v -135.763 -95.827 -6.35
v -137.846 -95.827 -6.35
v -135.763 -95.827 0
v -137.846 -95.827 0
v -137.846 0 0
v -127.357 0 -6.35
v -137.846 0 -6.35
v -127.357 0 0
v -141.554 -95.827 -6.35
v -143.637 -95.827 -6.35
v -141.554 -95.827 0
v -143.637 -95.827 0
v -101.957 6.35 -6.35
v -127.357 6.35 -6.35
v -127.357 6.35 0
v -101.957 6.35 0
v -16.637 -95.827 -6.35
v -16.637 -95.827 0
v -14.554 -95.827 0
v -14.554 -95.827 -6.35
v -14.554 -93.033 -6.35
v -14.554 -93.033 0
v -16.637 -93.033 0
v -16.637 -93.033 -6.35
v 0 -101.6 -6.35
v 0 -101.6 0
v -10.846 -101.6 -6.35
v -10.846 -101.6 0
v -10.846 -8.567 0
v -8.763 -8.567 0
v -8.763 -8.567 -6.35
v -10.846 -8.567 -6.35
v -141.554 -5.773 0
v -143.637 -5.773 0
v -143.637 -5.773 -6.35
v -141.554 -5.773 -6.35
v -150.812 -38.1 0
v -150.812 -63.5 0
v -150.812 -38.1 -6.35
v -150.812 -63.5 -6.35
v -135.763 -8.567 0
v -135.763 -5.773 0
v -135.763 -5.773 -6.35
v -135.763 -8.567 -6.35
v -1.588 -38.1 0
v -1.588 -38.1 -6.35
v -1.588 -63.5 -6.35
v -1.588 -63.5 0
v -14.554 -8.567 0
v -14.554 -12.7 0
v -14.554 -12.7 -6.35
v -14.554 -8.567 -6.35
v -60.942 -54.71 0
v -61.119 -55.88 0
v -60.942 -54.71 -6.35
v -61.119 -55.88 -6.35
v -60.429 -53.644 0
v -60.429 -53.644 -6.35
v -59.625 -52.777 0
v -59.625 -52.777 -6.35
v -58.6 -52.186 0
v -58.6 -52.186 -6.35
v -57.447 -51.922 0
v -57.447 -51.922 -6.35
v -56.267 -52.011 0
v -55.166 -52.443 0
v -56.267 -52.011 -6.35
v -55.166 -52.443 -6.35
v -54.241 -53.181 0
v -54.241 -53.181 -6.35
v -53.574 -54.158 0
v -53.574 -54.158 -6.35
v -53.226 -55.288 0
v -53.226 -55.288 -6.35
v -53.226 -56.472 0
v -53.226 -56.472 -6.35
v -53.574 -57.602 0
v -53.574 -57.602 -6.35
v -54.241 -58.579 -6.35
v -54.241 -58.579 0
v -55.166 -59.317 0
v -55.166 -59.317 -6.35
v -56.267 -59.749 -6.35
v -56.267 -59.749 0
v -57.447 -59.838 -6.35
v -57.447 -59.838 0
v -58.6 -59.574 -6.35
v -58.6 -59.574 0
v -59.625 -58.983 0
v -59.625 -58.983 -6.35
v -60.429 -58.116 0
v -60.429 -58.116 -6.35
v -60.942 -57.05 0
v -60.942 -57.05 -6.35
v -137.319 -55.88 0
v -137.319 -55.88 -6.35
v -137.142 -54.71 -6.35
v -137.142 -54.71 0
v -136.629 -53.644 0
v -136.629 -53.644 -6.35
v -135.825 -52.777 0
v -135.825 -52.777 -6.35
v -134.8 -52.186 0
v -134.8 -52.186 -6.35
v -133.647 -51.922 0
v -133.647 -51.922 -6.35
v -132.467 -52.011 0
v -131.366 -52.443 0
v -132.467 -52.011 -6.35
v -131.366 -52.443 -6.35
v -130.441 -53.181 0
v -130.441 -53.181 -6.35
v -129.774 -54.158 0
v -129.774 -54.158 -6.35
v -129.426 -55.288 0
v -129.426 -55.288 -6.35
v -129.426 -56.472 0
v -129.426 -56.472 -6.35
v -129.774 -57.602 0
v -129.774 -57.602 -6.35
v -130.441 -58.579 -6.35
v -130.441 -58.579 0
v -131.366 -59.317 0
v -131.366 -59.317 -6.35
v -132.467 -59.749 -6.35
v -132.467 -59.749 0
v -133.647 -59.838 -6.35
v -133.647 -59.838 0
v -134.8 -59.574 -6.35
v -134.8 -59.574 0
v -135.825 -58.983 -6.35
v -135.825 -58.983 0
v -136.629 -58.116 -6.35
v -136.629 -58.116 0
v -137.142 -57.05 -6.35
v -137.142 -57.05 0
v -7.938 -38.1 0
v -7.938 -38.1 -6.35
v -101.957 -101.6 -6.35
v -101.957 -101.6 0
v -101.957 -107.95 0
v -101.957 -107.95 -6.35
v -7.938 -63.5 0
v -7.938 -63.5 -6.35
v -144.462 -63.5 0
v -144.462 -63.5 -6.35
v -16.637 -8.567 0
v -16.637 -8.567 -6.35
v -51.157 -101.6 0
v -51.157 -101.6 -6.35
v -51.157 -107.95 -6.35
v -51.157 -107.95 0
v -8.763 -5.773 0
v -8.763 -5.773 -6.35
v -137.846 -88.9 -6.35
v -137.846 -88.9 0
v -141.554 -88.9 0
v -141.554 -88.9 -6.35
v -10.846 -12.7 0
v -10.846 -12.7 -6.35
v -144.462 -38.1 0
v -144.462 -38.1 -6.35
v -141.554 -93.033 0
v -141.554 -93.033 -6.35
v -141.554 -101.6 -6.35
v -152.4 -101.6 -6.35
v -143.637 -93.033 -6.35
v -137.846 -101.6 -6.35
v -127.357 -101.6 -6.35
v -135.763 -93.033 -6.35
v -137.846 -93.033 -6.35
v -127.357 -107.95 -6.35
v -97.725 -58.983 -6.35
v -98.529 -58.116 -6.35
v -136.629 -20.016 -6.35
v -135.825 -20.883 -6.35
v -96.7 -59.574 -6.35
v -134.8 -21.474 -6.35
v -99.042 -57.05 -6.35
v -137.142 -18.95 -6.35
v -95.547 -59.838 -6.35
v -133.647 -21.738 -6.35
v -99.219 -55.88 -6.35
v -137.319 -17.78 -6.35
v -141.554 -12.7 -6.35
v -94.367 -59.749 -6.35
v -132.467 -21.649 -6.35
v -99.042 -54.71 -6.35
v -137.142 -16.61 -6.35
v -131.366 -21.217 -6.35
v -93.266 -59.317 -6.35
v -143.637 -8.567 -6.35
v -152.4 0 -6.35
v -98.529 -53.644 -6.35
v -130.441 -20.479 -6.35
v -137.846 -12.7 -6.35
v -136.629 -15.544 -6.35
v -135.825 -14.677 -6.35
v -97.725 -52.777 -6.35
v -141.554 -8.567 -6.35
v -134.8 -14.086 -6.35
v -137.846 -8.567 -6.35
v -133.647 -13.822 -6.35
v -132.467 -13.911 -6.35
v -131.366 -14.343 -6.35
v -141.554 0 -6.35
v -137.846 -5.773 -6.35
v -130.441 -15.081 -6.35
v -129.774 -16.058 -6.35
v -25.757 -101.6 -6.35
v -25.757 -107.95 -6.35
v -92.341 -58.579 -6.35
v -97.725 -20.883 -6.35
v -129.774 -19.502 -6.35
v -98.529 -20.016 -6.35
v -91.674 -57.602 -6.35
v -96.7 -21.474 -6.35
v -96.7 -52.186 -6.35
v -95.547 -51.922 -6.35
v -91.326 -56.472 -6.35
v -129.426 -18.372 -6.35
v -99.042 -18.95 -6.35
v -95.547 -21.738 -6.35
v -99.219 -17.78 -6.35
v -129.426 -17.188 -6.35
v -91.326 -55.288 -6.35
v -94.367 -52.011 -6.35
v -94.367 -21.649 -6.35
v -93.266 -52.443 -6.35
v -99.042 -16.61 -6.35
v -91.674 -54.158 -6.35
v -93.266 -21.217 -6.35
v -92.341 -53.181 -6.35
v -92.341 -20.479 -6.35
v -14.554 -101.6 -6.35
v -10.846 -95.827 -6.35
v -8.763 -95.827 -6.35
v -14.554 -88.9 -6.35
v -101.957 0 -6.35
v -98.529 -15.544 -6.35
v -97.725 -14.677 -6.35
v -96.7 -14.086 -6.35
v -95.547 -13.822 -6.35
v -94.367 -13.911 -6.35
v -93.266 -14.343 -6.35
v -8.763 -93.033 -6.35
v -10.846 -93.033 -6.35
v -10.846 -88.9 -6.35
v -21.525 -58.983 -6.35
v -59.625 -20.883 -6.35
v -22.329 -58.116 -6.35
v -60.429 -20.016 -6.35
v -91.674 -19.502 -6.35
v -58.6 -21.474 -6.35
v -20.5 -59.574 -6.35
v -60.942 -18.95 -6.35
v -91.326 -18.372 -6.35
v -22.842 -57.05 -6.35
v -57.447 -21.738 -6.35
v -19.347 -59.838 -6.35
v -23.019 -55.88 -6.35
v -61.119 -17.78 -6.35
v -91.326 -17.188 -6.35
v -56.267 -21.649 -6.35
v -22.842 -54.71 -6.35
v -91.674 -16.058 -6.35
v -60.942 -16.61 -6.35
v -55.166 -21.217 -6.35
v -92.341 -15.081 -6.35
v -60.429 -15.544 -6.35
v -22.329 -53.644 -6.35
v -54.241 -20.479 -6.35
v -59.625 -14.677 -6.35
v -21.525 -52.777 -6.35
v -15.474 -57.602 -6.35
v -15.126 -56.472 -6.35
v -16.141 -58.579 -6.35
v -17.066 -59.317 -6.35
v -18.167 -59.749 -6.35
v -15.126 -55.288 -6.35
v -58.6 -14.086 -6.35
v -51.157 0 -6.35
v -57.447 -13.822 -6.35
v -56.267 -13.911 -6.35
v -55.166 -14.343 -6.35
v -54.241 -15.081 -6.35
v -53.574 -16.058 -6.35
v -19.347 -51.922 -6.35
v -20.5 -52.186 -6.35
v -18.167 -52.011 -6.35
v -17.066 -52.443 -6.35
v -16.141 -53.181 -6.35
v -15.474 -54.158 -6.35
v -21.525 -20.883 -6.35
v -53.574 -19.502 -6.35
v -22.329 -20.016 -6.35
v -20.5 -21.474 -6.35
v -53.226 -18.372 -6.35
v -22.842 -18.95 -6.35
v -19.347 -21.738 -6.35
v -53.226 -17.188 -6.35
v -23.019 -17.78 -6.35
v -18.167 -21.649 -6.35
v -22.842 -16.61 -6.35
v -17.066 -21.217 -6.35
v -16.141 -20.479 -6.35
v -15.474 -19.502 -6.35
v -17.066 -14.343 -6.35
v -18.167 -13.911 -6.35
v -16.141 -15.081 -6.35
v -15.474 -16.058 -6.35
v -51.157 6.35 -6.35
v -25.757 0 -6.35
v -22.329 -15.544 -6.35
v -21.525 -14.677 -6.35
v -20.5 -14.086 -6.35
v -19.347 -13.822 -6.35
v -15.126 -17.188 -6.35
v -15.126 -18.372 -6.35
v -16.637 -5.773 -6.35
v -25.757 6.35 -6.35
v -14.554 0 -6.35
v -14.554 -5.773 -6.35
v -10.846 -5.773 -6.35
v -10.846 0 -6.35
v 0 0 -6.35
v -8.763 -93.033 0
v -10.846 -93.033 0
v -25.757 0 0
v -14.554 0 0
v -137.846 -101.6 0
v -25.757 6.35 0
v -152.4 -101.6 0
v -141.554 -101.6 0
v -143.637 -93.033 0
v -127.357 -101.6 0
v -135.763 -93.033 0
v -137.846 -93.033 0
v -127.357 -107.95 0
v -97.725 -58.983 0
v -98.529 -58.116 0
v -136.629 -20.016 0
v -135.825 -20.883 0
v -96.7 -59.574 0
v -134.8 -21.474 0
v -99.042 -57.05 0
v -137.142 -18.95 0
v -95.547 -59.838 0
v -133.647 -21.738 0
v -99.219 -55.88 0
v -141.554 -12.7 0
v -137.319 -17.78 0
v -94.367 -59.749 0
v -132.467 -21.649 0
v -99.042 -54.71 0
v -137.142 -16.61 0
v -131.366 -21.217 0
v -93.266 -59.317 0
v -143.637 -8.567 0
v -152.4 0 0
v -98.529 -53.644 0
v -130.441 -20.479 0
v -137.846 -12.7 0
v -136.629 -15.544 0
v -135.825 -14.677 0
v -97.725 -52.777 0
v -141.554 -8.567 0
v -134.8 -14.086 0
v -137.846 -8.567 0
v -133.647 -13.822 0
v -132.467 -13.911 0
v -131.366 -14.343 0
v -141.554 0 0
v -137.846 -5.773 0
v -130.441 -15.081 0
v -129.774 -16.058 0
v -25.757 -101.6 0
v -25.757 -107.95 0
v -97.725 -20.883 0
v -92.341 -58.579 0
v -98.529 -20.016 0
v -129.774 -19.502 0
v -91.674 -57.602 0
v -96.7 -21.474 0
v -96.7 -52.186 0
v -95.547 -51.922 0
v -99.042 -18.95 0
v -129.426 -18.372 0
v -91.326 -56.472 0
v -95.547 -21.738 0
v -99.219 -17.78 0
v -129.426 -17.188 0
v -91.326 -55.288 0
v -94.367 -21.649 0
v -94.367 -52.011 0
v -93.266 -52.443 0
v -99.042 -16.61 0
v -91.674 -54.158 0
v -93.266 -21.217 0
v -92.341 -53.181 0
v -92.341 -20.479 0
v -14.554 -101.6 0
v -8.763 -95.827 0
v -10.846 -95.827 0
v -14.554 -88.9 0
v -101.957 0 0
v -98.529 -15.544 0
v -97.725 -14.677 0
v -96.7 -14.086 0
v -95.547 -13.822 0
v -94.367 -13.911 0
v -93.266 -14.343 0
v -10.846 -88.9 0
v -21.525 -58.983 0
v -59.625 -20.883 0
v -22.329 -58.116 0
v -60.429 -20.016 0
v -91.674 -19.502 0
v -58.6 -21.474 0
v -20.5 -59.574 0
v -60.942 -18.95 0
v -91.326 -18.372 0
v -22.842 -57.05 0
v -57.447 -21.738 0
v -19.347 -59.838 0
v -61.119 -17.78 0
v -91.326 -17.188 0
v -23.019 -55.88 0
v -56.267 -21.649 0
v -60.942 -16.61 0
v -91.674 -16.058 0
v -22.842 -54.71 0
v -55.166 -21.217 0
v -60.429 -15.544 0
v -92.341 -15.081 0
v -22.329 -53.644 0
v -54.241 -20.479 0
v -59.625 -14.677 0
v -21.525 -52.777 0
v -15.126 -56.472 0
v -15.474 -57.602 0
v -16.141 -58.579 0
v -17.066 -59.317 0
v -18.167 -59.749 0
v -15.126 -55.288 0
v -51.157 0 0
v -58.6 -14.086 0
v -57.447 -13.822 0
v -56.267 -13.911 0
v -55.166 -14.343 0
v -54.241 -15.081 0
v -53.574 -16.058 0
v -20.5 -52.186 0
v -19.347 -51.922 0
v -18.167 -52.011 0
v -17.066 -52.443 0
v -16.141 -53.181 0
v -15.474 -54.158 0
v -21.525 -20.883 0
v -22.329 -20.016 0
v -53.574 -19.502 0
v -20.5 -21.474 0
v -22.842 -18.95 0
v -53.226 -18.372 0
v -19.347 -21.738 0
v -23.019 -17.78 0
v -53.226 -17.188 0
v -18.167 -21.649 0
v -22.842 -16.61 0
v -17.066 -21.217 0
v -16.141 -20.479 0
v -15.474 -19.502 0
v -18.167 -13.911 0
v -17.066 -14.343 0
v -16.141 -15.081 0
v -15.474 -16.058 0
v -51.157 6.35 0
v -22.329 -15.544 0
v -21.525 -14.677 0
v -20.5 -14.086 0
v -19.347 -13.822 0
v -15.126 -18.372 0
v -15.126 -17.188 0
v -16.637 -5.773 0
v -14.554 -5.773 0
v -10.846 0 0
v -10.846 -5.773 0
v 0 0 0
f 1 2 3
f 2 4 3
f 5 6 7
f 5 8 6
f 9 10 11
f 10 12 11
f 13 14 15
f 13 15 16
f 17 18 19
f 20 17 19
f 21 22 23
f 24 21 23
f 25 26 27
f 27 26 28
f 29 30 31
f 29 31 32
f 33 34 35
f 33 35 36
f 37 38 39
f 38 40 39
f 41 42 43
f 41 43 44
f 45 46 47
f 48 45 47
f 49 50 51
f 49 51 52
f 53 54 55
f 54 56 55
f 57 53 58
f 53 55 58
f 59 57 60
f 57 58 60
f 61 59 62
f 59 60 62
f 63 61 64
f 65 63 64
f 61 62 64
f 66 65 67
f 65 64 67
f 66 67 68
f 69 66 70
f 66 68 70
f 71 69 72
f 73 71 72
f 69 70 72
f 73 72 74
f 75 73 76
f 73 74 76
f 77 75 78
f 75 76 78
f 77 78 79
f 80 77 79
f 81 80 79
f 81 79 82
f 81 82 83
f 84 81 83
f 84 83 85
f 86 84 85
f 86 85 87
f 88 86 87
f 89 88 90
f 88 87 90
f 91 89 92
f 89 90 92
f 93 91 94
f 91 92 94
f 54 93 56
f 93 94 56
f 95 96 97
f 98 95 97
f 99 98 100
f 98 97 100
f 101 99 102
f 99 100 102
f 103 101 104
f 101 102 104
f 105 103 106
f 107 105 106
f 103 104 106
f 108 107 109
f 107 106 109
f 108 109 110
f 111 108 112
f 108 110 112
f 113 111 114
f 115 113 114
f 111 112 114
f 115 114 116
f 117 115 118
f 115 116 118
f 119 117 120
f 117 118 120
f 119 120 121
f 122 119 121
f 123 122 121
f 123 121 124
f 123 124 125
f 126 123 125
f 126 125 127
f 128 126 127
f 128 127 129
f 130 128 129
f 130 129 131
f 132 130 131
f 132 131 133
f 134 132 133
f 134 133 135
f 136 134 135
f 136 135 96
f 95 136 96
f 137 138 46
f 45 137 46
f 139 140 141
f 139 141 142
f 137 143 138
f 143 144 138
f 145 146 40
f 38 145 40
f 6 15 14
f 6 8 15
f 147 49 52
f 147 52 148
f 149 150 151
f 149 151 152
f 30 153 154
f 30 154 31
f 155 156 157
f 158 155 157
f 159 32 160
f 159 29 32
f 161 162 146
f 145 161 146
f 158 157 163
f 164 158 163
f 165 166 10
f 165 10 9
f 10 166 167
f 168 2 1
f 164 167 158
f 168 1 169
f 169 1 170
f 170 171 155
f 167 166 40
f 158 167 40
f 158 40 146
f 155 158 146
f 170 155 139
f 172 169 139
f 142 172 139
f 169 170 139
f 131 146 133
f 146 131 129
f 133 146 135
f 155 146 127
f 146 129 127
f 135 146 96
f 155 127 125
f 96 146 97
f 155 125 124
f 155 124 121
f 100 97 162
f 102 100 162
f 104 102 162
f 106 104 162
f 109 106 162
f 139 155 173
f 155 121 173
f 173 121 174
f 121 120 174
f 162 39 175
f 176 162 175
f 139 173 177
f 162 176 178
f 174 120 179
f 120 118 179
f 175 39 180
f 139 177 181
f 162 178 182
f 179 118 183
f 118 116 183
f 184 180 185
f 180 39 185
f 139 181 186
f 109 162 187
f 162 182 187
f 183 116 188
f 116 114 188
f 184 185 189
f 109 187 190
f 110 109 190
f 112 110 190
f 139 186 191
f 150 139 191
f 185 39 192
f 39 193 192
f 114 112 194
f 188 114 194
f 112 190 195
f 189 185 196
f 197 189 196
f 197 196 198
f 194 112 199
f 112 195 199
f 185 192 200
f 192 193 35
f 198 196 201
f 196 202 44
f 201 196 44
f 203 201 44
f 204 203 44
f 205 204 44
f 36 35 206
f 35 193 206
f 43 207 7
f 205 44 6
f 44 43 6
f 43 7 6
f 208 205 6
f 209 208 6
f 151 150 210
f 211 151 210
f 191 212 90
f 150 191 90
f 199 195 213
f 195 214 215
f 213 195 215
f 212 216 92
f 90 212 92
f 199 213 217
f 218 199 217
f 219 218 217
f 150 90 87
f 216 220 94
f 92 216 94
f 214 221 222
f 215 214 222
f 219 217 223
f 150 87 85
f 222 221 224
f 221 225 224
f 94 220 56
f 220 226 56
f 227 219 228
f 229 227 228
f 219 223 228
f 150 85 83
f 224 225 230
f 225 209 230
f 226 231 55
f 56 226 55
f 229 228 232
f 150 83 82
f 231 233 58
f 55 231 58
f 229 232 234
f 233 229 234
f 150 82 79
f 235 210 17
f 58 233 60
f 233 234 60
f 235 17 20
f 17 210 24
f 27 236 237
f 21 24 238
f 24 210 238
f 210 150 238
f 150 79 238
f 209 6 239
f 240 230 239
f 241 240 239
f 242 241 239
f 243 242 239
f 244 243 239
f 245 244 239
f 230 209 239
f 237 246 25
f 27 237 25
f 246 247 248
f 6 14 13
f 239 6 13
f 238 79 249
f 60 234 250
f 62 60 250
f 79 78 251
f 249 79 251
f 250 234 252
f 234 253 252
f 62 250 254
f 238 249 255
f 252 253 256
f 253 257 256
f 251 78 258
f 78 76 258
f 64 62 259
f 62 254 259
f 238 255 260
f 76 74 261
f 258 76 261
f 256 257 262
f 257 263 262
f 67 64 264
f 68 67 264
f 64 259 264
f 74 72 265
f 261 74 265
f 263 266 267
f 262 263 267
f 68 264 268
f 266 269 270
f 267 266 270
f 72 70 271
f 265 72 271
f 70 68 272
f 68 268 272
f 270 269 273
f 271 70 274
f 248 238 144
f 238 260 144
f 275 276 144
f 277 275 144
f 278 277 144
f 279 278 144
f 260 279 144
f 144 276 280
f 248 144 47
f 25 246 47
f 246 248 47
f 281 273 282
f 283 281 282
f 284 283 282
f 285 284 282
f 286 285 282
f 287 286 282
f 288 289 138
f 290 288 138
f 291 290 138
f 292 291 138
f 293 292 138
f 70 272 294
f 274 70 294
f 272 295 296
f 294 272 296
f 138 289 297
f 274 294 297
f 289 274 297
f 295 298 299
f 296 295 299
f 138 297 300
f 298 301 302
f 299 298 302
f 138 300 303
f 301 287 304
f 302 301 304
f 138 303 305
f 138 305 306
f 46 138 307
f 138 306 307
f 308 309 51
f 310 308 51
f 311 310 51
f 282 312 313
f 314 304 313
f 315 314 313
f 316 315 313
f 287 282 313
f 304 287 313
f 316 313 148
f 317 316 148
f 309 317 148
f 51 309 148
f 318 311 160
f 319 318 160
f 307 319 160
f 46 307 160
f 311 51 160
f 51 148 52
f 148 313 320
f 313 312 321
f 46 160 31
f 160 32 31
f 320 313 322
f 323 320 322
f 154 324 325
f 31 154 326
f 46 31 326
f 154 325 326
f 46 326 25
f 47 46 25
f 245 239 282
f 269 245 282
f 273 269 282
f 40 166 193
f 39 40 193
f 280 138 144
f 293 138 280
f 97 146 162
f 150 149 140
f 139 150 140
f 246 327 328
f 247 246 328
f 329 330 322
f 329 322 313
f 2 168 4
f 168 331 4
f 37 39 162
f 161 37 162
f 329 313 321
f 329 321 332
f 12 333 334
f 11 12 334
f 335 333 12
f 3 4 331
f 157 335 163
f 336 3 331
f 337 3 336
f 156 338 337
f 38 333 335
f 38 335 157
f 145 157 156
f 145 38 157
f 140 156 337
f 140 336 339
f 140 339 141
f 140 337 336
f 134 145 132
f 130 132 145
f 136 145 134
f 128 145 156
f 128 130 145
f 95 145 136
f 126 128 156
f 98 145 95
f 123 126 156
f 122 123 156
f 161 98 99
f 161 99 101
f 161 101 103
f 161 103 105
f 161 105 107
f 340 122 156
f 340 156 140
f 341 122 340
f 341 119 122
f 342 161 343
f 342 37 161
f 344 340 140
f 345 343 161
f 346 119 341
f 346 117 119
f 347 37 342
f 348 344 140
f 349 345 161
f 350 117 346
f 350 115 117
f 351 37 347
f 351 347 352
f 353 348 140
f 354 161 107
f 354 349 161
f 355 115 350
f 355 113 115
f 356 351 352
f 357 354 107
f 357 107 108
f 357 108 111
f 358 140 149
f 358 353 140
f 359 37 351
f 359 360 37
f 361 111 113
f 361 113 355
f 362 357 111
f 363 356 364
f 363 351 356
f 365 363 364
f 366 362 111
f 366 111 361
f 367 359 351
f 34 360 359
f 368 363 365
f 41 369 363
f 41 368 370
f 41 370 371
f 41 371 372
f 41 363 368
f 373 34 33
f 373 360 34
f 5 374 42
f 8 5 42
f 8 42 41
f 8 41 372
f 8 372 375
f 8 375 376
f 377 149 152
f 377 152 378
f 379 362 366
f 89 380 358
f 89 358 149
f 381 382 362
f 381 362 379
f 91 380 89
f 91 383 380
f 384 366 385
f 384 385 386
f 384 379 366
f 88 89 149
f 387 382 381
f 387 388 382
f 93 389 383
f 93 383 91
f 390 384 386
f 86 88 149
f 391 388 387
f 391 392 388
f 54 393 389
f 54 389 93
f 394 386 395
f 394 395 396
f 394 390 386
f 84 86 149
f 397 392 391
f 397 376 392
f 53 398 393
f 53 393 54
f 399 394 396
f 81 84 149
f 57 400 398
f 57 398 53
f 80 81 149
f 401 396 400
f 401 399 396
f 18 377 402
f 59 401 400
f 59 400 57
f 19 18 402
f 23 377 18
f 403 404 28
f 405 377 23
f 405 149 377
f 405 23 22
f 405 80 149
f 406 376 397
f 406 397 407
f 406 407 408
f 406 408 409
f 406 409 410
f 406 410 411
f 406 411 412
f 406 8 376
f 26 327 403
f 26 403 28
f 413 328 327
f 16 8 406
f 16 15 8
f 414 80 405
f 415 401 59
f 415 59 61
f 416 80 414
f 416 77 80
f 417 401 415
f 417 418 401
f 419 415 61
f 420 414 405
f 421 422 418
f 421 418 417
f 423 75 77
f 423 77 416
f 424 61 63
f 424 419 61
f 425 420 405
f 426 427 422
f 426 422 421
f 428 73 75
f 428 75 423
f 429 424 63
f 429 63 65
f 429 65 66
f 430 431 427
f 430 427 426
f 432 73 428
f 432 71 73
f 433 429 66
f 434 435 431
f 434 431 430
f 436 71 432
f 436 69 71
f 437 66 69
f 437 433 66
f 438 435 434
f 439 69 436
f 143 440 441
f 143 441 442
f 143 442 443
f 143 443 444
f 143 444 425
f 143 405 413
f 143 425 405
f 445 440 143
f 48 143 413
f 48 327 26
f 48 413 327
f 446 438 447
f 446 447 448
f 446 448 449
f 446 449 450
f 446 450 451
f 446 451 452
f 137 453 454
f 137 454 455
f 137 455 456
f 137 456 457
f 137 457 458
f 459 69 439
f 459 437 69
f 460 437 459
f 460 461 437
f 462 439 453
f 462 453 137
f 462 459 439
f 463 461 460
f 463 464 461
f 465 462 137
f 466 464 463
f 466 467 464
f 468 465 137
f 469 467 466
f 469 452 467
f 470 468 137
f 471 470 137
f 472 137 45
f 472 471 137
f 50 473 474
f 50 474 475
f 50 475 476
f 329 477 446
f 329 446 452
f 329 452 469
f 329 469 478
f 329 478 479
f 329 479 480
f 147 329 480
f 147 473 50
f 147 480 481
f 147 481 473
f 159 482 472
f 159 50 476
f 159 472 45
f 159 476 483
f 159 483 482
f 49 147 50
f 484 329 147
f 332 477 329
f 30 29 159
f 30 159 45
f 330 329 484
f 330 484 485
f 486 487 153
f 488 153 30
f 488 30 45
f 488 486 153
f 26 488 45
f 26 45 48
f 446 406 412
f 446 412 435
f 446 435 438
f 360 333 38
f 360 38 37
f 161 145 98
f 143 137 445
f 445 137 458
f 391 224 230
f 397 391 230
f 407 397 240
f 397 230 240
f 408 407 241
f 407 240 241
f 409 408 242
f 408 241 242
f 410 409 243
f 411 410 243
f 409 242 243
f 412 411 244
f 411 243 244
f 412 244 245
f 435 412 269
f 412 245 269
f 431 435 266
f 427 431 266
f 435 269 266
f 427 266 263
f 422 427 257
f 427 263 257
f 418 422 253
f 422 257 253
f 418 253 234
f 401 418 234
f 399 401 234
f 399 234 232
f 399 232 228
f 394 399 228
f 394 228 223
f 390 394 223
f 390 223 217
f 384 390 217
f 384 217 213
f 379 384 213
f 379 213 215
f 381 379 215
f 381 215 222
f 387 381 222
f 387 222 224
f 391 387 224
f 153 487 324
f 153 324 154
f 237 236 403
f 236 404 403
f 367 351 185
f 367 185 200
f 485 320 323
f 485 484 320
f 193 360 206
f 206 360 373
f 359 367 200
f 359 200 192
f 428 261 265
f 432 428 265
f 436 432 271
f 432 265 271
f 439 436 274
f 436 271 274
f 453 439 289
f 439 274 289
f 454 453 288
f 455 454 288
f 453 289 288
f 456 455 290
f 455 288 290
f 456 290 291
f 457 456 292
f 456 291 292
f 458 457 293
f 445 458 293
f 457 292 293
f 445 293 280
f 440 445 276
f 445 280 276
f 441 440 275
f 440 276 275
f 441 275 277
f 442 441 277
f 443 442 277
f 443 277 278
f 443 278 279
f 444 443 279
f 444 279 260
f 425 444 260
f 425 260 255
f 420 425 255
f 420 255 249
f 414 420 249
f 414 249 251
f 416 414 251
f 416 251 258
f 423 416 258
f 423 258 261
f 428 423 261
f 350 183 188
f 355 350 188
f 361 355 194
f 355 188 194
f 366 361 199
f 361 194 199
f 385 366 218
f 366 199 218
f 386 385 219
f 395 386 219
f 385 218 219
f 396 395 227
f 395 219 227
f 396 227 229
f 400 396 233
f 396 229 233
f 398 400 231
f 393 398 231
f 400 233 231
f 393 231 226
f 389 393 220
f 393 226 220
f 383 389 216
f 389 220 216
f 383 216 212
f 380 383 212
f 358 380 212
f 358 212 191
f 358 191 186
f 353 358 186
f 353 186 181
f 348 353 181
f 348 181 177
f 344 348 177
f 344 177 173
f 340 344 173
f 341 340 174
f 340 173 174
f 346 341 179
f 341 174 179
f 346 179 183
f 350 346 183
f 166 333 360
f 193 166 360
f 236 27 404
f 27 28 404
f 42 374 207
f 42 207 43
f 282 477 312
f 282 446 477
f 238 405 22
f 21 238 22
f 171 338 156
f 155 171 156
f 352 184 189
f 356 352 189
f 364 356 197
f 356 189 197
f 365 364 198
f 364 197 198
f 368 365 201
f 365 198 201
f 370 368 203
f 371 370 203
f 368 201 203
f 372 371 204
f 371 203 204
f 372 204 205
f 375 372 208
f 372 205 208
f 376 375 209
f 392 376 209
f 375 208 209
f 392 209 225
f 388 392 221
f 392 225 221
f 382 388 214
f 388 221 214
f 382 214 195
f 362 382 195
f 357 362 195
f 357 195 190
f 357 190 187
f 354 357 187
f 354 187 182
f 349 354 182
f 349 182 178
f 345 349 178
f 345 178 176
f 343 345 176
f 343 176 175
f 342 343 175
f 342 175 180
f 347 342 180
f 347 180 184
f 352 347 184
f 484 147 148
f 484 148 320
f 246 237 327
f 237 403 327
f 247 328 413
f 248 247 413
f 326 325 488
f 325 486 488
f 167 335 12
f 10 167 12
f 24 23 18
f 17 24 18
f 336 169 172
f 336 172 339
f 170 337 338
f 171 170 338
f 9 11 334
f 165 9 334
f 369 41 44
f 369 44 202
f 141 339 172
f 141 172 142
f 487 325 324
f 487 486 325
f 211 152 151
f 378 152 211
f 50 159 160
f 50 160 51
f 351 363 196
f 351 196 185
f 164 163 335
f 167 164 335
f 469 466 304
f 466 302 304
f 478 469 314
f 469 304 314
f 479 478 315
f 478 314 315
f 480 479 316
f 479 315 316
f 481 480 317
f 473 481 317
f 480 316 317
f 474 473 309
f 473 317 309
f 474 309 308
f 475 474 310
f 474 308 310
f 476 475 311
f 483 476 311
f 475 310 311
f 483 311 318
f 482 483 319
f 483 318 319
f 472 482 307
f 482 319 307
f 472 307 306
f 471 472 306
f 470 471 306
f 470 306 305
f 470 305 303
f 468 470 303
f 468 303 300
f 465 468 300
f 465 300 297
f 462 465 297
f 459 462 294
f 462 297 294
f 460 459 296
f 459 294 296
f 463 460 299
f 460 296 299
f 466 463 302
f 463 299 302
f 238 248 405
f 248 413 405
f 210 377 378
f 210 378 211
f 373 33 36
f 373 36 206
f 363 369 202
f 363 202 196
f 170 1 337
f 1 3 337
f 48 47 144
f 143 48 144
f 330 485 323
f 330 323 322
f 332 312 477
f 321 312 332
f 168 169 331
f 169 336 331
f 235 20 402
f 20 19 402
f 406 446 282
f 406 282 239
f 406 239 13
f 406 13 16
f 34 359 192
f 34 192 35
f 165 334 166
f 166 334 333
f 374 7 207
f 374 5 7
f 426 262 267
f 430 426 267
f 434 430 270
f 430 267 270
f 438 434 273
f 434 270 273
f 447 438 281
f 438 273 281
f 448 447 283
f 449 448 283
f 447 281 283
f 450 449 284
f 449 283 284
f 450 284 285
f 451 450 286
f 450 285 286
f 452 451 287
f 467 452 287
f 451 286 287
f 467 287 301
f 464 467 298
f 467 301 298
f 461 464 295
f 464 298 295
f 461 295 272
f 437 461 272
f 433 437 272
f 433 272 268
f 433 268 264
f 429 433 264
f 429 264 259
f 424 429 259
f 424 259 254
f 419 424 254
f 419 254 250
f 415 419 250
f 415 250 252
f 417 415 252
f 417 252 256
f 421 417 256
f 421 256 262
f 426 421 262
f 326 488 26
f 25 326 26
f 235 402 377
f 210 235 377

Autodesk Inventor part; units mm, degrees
ref_plane "YZ Plane" through (0, 0, 0) normal (1, 0, 0) x (0, 1, 0)
ref_plane "Work Plane1" through (0, 0, 0) normal (0, 0, 1) x (1, 0, 0)
sketch "Sketch1" plane through (0, 0, 0) normal (0, 0, 1) x (1, 0, 0)
  line L0 (-77.8391, 0) -> (-108.8361, 0) projected
  line L1 (-108.8361, -33.02) -> (-108.8361, 0) projected
  line L2 (-77.8391, -33.02) -> (-108.8361, -33.02) projected
  line L3 (-77.8391, -33.02) -> (-77.8391, 0) projected
  line L4 (-152.4, 0) -> (0, 0) construction
  line L5 (-152.4, 0) -> (-152.4, 6.35) construction
  line L6 (0, 0) -> (0, 6.35) construction
  line L7 (-152.4, 0) -> (0, 0)
  line L8 (0, 0) -> (0, -101.6)
  line L9 (0, -101.6) -> (-152.4, -101.6)
  line L10 (-152.4, -101.6) -> (-152.4, 0)
  line L11 (-137.8458, 6.35) -> (-137.8458, 0)
  line L12 (-141.5542, 6.35) -> (-141.5542, 0)
  line L13 (-14.5542, 6.35) -> (-14.5542, 0)
  line L14 (-10.8458, 6.35) -> (-10.8458, 0)
  line L15 (-141.5542, 0) -> (-137.8458, 0)
  line L16 (-137.8458, 0) -> (-137.8458, -12.7)
  line L17 (-137.8458, -12.7) -> (-141.5542, -12.7)
  line L18 (-141.5542, -12.7) -> (-141.5542, 0)
  line L19 (-14.5542, 0) -> (-10.8458, 0)
  line L20 (-10.8458, 0) -> (-10.8458, -12.7)
  line L21 (-10.8458, -12.7) -> (-14.5542, -12.7)
  line L22 (-14.5542, -12.7) -> (-14.5542, 0)
  line L23 (-16.637, -5.7726) -> (-8.763, -5.7726)
  line L24 (-8.763, -5.7726) -> (-8.763, -8.5666)
  line L25 (-8.763, -8.5666) -> (-16.637, -8.5666)
  line L26 (-16.637, -8.5666) -> (-16.637, -5.7726)
  line L27 (-143.637, -5.7726) -> (-135.763, -5.7726)
  line L28 (-135.763, -5.7726) -> (-135.763, -8.5666)
  line L29 (-135.763, -8.5666) -> (-143.637, -8.5666)
  line L30 (-143.637, -8.5666) -> (-143.637, -5.7726)
  line L31 (-152.4, -50.8) -> (0, -50.8) construction
  line L32 (-137.8458, -107.95) -> (-137.8458, -101.6)
  line L33 (-141.5542, -107.95) -> (-141.5542, -101.6)
  line L34 (-14.5542, -107.95) -> (-14.5542, -101.6)
  line L35 (-10.8458, -107.95) -> (-10.8458, -101.6)
  line L36 (-141.5542, -101.6) -> (-137.8458, -101.6)
  line L37 (-137.8458, -101.6) -> (-137.8458, -88.9)
  line L38 (-137.8458, -88.9) -> (-141.5542, -88.9)
  line L39 (-141.5542, -88.9) -> (-141.5542, -101.6)
  line L40 (-14.5542, -101.6) -> (-10.8458, -101.6)
  line L41 (-10.8458, -101.6) -> (-10.8458, -88.9)
  line L42 (-10.8458, -88.9) -> (-14.5542, -88.9)
  line L43 (-14.5542, -88.9) -> (-14.5542, -101.6)
  line L44 (-16.637, -95.8274) -> (-8.763, -95.8274)
  line L45 (-8.763, -95.8274) -> (-8.763, -93.0334)
  line L46 (-8.763, -93.0334) -> (-16.637, -93.0334)
  line L47 (-16.637, -93.0334) -> (-16.637, -95.8274)
  line L48 (-143.637, -95.8274) -> (-135.763, -95.8274)
  line L49 (-135.763, -95.8274) -> (-135.763, -93.0334)
  line L50 (-135.763, -93.0334) -> (-143.637, -93.0334)
  line L51 (-143.637, -93.0334) -> (-143.637, -95.8274)
  dimension "d0" = 101.6
  dimension "d1" = 12.7
  dimension "d2" = 7.874
  dimension "d3" = 2.794
  dimension "d6" = 2.0828
  dimension "d7" = 2.0828
  dimension "d8" = 7.874
  dimension "d9" = 2.0828
  dimension "d10" = 2.0828
ref_plane "Work Plane2" through (-137.8458, 0, 0) normal (0, 1, 0) x (1, 0, 0)
sketch "Sketch2" plane through (-137.8458, 0, 0) normal (0, 1, 0) x (1, 0, 0)
  line L0 (35.8892, 0) -> (10.4892, 0) projected
  line L1 (10.4892, 0) -> (10.4892, 6.35) projected
  line L2 (10.4892, 6.35) -> (35.8892, 6.35) projected
  line L3 (35.8892, 6.35) -> (35.8892, 0) projected
  line L4 (112.0892, 0) -> (86.6892, 0) projected
  line L5 (112.0892, 6.35) -> (112.0892, 0) projected
  line L6 (86.6892, 6.35) -> (112.0892, 6.35) projected
  line L7 (86.6892, 0) -> (86.6892, 6.35) projected
  point P0 (137.8458, 0)
extrude "Extrusion2" add sketch "Sketch2" along normal blind 6.35
extrude "Extrusion3" add sketch "Sketch1" against normal blind 6.35 contours L3 L2 L1 L0 | L7 L22 L23 L26 L25 L21 L20 L24 L8 L9 L41 L44 L45 L46 L42 L43 L47 L37 L48 L49 L50 L38 L39 L51 L10 L18 L27 L30 L29 L17 L16 L28 L1 L2 L3
sketch "Sketch3" plane through (-137.8458, -101.6, 0) normal (0, -1, 0) x (1, 0, 0)
  line L0 (35.8892, 0) -> (35.8892, -6.35) projected
  line L1 (35.8892, -6.35) -> (10.4892, -6.35) projected
  line L2 (10.4892, -6.35) -> (10.4892, 0) projected
  line L3 (10.4892, 0) -> (35.8892, 0) projected
  line L4 (112.0892, 0) -> (112.0892, -6.35) projected
  line L5 (112.0892, -6.35) -> (86.6892, -6.35) projected
  line L6 (86.6892, -6.35) -> (86.6892, 0) projected
  line L7 (86.6892, 0) -> (112.0892, 0) projected
  point P0 (137.8458, 0)
extrude "Extrusion4" add sketch "Sketch3" along normal blind 6.35
sketch "Sketch4" plane through (-101.9566, 6.35, -6.35) normal (0, 0, -1) x (-1, 0, 0)
  line L0 (48.8559, -69.85) -> (48.8559, -44.45) projected
  line L1 (48.8559, -44.45) -> (42.5059, -44.45) projected
  line L2 (42.5059, -44.45) -> (42.5059, -69.85) projected
  line L3 (42.5059, -69.85) -> (48.8559, -69.85) projected
extrude "Extrusion5" cut sketch "Sketch4" against normal through all
ref_plane "Work Plane3" through (-76.2, -101.6, 0) normal (-1, 0, 0) x (0, 0, 1)
mirror "Mirror1" about plane through (-76.2, -101.6, 0) normal (-1, 0, 0) of "Extrusion5"
sketch "Sketch5" plane through (-101.9566, 6.35, -6.35) normal (0, 0, -1) x (-1, 0, 0)
  line L0 (0, -6.35) -> (-50.8, -6.35) projected
  line L1 (-101.9566, -6.35) -> (-101.9566, -107.95) projected
  line L2 (50.4434, -107.95) -> (50.4434, -6.35) projected
  line L3 (35.8892, -6.35) -> (25.4, -6.35) projected
  circle A0 centre (31.3934, -24.13) radius 3.9688
  circle A1 centre (-6.7066, -24.13) radius 3.9688
  circle A2 centre (-44.8066, -24.13) radius 3.9688
  circle A3 centre (-82.9066, -24.13) radius 3.9688
  circle A4 centre (31.3934, -62.23) radius 3.9688
  circle A5 centre (-6.7066, -62.23) radius 3.9688
  circle A6 centre (-44.8066, -62.23) radius 3.9688
  circle A7 centre (-82.9066, -62.23) radius 3.9688
  dimension "d21" = 7.9375
  dimension "d22" = 17.78
  dimension "d25" = 38.1
  dimension "d30" = 19.05
  dimension "d31" = 19.05
  dimension "d34" = 38.1
extrude "Extrusion6" cut sketch "Sketch5" against normal through all
equation "\"d6\" = d7"
equation "\"d9\" = d10"
equation "\"d30\" = d31"
properties part number "baseBoxShortSideRB02"
